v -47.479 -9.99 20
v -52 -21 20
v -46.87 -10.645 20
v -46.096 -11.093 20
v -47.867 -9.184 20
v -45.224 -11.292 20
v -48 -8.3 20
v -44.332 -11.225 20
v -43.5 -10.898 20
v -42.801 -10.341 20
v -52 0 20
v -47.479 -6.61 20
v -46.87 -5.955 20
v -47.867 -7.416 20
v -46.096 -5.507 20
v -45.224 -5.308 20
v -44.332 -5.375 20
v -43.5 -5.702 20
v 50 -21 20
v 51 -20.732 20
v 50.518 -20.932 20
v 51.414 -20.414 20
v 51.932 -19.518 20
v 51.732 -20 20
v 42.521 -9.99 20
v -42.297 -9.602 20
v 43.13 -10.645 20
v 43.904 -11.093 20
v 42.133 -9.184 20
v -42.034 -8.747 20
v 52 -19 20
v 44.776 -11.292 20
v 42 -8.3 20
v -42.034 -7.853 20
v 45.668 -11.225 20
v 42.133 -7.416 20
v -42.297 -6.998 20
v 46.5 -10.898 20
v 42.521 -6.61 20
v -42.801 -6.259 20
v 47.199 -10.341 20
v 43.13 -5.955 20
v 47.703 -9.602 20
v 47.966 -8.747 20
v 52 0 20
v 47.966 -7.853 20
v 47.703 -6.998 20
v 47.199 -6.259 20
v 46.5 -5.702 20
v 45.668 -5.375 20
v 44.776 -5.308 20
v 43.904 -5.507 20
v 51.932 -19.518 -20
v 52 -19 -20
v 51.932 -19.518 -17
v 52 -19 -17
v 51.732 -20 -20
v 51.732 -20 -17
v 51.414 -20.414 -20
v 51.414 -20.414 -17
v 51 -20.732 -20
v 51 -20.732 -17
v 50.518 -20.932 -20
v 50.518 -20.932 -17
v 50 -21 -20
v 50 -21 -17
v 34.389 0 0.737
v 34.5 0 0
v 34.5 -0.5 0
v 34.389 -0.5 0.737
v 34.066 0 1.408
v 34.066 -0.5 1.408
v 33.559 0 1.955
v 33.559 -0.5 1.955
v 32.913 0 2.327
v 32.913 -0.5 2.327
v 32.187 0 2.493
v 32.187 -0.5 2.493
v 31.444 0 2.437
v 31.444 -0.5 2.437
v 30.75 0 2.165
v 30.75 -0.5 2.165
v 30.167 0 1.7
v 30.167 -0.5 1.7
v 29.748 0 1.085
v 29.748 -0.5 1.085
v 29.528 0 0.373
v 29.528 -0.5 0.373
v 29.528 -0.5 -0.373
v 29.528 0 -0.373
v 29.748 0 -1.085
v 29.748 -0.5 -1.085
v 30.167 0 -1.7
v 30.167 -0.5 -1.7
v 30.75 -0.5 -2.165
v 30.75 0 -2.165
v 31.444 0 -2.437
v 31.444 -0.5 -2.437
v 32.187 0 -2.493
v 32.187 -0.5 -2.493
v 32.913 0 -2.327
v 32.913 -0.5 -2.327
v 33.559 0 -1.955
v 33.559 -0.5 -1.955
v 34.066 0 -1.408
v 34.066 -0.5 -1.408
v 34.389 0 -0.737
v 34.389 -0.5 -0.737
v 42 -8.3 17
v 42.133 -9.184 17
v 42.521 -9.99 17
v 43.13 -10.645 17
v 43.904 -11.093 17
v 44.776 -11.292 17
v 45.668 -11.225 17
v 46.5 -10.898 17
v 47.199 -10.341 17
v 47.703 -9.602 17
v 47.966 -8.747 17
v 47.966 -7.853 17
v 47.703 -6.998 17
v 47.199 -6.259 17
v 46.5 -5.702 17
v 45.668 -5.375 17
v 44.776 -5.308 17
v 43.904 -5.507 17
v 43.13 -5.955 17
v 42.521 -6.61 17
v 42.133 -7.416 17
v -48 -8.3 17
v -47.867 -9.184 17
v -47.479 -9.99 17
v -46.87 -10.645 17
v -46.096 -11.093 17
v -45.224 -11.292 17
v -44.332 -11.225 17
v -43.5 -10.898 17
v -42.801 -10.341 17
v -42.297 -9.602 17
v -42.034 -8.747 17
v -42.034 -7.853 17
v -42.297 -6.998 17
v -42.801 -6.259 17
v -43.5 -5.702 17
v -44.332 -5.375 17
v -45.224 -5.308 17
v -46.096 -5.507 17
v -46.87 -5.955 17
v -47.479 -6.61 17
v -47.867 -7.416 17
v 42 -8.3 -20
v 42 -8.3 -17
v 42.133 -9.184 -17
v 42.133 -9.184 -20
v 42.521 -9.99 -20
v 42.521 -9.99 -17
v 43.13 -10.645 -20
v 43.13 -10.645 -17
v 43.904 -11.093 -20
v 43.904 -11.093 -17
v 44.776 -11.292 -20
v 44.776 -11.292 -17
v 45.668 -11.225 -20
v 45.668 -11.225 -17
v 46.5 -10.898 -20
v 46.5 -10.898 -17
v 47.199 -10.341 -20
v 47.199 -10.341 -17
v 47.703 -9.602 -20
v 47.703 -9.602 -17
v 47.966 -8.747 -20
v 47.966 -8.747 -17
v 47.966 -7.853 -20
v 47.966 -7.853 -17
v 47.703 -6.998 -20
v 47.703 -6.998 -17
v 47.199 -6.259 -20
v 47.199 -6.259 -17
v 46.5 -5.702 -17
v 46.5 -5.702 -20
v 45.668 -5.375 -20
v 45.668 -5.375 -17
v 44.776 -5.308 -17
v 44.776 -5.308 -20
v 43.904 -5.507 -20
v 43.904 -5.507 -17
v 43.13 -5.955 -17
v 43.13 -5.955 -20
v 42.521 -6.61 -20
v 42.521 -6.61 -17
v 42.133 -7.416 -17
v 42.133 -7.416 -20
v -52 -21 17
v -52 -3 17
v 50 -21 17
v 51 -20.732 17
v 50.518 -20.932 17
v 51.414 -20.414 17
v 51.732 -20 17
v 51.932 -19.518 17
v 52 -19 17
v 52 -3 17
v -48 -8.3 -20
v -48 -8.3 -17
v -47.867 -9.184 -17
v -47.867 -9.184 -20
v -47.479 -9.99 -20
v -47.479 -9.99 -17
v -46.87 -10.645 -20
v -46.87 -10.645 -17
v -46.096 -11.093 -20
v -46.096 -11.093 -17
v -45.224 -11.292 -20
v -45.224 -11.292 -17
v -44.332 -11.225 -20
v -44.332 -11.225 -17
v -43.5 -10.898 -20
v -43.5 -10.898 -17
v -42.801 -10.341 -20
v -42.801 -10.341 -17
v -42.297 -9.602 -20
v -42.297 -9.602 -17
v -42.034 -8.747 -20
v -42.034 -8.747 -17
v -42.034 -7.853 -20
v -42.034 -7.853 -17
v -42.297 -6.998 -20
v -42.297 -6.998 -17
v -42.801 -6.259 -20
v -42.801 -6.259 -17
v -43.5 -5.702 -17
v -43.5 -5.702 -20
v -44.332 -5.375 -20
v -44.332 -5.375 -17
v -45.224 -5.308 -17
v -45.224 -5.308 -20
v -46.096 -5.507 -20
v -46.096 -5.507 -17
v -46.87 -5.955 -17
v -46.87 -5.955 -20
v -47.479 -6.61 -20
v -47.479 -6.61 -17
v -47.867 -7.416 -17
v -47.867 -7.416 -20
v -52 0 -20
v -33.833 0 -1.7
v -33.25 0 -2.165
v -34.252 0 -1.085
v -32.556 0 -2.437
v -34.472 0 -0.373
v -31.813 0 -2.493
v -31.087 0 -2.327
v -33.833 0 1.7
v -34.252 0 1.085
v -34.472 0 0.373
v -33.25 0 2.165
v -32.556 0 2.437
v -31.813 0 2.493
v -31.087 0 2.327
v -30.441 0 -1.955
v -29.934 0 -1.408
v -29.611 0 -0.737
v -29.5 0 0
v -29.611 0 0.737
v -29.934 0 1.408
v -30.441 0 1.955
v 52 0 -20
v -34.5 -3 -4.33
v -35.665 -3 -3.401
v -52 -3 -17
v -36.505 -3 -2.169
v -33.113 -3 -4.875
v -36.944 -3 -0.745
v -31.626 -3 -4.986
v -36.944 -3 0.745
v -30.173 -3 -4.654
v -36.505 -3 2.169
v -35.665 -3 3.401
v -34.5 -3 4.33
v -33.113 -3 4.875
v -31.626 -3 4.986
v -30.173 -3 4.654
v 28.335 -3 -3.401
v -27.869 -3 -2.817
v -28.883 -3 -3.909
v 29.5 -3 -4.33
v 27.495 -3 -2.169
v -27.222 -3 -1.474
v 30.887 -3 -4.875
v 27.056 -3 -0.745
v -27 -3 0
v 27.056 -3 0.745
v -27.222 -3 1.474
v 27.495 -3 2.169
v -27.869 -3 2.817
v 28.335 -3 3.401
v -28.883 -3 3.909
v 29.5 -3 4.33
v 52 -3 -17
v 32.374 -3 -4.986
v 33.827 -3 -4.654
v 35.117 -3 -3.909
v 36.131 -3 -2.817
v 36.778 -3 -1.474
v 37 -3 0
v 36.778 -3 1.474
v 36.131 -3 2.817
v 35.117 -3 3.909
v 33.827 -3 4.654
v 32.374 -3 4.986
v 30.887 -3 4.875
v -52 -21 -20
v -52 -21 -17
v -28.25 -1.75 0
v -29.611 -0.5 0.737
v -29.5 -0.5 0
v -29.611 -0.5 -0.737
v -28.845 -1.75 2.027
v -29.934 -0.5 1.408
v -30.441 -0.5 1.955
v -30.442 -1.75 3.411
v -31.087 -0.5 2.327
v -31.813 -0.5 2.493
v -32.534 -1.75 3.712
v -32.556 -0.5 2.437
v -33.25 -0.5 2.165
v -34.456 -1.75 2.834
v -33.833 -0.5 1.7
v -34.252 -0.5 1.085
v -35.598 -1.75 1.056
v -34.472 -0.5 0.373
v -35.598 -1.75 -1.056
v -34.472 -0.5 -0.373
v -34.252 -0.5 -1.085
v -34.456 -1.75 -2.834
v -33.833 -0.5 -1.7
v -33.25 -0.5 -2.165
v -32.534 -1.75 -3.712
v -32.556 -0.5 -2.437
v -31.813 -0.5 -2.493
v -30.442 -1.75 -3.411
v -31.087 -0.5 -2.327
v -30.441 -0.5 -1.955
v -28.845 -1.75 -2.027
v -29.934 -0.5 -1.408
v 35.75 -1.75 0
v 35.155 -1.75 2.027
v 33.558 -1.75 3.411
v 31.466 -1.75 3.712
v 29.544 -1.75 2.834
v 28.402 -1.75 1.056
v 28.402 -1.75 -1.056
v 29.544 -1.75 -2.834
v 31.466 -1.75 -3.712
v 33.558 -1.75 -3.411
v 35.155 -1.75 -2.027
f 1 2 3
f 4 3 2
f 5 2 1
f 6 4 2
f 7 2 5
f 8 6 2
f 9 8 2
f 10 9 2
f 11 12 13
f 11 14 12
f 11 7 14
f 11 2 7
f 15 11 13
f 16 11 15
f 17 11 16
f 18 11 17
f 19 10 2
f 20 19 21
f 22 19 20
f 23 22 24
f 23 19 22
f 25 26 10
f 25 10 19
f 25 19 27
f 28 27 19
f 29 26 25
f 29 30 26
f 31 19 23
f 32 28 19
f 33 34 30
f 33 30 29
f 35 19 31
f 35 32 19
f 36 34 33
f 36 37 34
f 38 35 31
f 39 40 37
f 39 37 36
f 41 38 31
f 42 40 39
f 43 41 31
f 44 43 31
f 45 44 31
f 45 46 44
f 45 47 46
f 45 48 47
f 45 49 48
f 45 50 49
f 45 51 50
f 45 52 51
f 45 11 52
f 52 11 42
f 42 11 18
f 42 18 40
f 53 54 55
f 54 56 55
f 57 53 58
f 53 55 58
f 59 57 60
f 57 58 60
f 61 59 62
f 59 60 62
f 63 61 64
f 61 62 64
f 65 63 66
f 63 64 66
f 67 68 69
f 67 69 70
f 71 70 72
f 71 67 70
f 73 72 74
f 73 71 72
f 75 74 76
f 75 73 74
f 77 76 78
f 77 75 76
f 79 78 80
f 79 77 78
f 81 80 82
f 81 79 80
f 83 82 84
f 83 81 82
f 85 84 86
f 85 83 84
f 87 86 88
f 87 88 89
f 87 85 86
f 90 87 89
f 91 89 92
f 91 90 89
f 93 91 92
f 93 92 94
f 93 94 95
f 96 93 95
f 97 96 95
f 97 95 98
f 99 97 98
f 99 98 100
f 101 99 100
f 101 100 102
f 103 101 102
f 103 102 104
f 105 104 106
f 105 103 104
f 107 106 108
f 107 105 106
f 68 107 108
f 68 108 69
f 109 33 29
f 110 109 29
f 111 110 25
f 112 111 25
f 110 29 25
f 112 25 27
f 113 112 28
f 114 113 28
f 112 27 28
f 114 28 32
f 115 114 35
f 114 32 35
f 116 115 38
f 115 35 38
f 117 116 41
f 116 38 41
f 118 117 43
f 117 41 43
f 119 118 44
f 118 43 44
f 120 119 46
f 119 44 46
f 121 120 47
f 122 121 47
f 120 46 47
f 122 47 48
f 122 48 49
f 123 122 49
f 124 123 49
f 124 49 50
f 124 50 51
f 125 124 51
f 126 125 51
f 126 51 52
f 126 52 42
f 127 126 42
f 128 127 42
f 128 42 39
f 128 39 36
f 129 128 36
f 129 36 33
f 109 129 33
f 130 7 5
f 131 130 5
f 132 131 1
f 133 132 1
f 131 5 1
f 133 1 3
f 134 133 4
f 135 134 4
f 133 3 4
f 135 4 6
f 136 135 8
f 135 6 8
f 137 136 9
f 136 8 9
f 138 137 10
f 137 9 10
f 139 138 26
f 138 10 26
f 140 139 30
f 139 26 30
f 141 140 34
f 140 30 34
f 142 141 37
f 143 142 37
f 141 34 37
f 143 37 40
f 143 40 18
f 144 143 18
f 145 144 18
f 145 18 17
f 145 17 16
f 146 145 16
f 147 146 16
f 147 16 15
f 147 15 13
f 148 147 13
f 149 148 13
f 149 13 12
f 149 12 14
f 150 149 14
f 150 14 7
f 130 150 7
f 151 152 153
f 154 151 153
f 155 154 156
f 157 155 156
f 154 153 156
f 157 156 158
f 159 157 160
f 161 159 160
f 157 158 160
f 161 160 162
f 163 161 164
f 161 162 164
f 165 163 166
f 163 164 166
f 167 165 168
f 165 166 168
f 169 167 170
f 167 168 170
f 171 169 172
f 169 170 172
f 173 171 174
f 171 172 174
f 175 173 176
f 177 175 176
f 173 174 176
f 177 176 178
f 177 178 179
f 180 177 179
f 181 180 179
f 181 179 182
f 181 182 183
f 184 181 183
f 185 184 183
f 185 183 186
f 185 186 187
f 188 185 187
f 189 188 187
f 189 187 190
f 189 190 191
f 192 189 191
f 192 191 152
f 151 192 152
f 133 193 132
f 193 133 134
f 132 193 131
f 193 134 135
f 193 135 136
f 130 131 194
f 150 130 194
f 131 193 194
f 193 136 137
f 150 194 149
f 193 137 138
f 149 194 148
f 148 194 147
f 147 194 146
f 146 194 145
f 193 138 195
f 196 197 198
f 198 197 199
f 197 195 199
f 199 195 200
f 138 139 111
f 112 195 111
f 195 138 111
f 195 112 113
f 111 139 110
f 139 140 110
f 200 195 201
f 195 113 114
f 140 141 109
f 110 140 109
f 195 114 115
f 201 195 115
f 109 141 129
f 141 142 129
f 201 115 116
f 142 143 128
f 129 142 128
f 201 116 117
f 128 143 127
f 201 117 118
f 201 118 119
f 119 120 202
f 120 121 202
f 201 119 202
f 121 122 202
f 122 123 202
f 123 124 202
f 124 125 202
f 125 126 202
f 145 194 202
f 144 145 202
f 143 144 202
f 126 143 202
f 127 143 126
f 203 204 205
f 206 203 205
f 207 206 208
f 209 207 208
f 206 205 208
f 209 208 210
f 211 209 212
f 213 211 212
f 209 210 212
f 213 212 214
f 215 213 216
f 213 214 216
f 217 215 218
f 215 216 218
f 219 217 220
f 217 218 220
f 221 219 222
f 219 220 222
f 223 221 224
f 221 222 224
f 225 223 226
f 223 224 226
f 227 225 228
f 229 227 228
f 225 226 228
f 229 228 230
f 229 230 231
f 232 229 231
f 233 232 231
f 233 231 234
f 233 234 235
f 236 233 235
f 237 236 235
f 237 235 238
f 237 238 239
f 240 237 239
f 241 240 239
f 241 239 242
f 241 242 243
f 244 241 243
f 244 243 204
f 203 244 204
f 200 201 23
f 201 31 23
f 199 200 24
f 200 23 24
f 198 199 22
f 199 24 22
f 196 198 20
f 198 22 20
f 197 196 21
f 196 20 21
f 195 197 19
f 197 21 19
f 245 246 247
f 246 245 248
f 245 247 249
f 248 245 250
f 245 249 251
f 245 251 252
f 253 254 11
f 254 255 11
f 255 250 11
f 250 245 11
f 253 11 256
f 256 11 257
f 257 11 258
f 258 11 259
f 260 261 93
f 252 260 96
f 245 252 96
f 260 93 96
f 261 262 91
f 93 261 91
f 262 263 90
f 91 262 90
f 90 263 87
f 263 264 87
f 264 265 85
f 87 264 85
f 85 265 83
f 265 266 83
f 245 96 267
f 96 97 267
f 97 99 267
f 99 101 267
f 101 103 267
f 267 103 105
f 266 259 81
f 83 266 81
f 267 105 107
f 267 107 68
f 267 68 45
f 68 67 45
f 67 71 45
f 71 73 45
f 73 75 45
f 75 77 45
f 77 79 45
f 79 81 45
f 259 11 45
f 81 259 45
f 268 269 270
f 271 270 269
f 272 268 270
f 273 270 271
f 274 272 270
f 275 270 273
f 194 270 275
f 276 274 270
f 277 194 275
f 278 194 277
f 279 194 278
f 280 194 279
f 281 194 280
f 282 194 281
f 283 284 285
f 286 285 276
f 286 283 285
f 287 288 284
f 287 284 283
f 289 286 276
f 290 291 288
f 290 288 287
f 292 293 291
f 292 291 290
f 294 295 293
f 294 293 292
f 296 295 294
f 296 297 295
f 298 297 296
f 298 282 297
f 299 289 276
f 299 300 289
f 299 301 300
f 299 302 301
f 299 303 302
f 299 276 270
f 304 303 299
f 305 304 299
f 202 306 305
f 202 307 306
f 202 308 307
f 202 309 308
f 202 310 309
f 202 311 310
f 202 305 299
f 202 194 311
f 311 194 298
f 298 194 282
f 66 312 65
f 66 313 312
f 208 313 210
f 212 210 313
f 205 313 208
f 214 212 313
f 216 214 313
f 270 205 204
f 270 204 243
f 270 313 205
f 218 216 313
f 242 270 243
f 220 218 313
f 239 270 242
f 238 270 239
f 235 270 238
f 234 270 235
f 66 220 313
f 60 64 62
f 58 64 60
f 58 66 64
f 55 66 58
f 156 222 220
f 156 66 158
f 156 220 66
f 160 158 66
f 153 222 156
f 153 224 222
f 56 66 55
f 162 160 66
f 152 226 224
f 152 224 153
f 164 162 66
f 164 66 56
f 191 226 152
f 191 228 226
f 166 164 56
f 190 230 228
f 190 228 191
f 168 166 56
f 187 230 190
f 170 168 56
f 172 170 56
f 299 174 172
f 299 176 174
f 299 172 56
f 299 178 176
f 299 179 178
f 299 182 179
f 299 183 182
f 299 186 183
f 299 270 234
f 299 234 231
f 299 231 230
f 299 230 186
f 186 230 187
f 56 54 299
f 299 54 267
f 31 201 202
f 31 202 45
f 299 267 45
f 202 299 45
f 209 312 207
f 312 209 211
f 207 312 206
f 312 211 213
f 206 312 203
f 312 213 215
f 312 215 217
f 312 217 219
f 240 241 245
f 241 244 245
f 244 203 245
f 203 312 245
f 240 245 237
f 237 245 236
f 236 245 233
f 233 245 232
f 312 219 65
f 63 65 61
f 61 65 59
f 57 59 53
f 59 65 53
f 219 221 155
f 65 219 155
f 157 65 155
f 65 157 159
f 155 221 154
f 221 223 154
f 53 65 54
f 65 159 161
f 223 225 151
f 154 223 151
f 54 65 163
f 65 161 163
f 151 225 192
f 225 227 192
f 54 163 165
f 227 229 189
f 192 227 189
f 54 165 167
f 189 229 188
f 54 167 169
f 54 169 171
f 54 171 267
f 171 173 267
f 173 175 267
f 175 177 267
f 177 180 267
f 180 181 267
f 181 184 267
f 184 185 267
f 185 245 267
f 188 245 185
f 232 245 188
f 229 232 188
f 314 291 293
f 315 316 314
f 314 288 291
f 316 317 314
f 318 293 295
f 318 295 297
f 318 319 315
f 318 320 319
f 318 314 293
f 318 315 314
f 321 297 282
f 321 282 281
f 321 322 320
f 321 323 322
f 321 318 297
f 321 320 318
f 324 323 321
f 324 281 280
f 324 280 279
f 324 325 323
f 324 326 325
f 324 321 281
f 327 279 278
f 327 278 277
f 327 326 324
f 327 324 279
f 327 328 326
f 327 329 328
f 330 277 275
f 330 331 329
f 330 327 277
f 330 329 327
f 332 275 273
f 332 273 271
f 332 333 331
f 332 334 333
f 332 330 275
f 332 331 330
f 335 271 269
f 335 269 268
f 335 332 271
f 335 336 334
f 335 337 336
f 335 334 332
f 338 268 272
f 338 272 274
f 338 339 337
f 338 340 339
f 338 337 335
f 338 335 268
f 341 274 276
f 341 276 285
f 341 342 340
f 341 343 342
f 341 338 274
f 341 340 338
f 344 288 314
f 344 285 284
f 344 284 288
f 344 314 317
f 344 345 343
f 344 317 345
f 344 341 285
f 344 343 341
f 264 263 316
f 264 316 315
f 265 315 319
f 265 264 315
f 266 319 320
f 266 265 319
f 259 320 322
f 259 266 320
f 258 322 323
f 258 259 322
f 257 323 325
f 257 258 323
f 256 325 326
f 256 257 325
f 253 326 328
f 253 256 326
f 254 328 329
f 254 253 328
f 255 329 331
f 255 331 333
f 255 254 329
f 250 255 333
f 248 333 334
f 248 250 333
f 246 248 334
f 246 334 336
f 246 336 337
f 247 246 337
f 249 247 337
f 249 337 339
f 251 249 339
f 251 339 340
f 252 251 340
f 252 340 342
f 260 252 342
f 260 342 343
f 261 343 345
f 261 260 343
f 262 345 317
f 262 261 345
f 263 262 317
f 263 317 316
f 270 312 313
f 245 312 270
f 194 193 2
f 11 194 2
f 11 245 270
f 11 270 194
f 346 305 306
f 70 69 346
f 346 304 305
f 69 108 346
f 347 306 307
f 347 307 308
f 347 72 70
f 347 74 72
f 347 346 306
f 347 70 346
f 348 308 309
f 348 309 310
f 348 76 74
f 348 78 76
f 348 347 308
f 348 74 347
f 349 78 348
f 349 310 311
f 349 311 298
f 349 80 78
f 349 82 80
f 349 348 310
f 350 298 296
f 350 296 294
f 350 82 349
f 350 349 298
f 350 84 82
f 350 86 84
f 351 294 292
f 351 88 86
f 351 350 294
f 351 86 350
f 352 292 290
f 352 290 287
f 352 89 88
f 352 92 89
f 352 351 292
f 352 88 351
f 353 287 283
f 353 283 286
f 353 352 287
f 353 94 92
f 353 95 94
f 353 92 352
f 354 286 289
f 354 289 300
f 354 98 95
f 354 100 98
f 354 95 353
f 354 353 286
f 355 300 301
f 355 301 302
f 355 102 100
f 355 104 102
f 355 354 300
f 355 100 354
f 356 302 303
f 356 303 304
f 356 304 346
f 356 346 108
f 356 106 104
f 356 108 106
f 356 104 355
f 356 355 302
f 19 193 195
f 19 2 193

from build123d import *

# Parameters (mm, degrees)
F0_W     = 104
F0_H     = 3
F1_DEPTH = 21
F0_H_2   = 34
F0_R     = 2.5
F2_DEPTH = 3
F4_D     = 6
F5_SIZE  = 2.5
F6_SIZE  = 2.5
F7_R     = 2


with BuildPart() as f1:
    # F0 (on Front) → F1 (new body)
    with BuildSketch(Plane.XZ):
        with Locations((0, 18.5)):
            Rectangle(F0_W, F0_H)
    extrude(amount=F1_DEPTH)



with BuildPart() as f1b:
    # F0 (on Front) → F1, piece 2 (new body)
    with BuildSketch(Plane.XZ):
        with Locations((0, -18.5)):
            Rectangle(F0_W, F0_H)
    extrude(amount=F1_DEPTH)


with BuildPart() as f1_1:
    add(f1.part)

    add(f1b.part)  # F2 merges F1b
    # F0 (on Front) → F2 (join)
    with BuildSketch(Plane.XZ):
        Rectangle(F0_W, F0_H_2)
        with Locations((-32, 0)):
            Circle(F0_R, mode=Mode.SUBTRACT)
        with Locations((32, 0)):
            Circle(F0_R, mode=Mode.SUBTRACT)
    extrude(amount=F2_DEPTH)

    # F4 (through all)
    with Locations(Plane(origin=(0, 0, -20), x_dir=(1, 0, 0), z_dir=(0, 0, -1))):
        with Locations((-45, 8.3), (45, 8.2999998429)):
            Hole(F4_D / 2)

    # F5
    f5_edges = [f1_1.edges().sort_by_distance(p)[0] for p in [
        (-34.5, -3, 0),
    ]]
    chamfer(f5_edges, length=F5_SIZE)

    # F6
    f6_edges = [f1_1.edges().sort_by_distance(p)[0] for p in [
        (29.5, -3, 0),
    ]]
    chamfer(f6_edges, length=F6_SIZE)

    # F7
    f7_edges = [f1_1.edges().sort_by_distance(p)[0] for p in [
        (52, -21, -18.5),
        (52, -21, 18.5),
    ]]
    fillet(f7_edges, radius=F7_R)


solid = f1_1.part
